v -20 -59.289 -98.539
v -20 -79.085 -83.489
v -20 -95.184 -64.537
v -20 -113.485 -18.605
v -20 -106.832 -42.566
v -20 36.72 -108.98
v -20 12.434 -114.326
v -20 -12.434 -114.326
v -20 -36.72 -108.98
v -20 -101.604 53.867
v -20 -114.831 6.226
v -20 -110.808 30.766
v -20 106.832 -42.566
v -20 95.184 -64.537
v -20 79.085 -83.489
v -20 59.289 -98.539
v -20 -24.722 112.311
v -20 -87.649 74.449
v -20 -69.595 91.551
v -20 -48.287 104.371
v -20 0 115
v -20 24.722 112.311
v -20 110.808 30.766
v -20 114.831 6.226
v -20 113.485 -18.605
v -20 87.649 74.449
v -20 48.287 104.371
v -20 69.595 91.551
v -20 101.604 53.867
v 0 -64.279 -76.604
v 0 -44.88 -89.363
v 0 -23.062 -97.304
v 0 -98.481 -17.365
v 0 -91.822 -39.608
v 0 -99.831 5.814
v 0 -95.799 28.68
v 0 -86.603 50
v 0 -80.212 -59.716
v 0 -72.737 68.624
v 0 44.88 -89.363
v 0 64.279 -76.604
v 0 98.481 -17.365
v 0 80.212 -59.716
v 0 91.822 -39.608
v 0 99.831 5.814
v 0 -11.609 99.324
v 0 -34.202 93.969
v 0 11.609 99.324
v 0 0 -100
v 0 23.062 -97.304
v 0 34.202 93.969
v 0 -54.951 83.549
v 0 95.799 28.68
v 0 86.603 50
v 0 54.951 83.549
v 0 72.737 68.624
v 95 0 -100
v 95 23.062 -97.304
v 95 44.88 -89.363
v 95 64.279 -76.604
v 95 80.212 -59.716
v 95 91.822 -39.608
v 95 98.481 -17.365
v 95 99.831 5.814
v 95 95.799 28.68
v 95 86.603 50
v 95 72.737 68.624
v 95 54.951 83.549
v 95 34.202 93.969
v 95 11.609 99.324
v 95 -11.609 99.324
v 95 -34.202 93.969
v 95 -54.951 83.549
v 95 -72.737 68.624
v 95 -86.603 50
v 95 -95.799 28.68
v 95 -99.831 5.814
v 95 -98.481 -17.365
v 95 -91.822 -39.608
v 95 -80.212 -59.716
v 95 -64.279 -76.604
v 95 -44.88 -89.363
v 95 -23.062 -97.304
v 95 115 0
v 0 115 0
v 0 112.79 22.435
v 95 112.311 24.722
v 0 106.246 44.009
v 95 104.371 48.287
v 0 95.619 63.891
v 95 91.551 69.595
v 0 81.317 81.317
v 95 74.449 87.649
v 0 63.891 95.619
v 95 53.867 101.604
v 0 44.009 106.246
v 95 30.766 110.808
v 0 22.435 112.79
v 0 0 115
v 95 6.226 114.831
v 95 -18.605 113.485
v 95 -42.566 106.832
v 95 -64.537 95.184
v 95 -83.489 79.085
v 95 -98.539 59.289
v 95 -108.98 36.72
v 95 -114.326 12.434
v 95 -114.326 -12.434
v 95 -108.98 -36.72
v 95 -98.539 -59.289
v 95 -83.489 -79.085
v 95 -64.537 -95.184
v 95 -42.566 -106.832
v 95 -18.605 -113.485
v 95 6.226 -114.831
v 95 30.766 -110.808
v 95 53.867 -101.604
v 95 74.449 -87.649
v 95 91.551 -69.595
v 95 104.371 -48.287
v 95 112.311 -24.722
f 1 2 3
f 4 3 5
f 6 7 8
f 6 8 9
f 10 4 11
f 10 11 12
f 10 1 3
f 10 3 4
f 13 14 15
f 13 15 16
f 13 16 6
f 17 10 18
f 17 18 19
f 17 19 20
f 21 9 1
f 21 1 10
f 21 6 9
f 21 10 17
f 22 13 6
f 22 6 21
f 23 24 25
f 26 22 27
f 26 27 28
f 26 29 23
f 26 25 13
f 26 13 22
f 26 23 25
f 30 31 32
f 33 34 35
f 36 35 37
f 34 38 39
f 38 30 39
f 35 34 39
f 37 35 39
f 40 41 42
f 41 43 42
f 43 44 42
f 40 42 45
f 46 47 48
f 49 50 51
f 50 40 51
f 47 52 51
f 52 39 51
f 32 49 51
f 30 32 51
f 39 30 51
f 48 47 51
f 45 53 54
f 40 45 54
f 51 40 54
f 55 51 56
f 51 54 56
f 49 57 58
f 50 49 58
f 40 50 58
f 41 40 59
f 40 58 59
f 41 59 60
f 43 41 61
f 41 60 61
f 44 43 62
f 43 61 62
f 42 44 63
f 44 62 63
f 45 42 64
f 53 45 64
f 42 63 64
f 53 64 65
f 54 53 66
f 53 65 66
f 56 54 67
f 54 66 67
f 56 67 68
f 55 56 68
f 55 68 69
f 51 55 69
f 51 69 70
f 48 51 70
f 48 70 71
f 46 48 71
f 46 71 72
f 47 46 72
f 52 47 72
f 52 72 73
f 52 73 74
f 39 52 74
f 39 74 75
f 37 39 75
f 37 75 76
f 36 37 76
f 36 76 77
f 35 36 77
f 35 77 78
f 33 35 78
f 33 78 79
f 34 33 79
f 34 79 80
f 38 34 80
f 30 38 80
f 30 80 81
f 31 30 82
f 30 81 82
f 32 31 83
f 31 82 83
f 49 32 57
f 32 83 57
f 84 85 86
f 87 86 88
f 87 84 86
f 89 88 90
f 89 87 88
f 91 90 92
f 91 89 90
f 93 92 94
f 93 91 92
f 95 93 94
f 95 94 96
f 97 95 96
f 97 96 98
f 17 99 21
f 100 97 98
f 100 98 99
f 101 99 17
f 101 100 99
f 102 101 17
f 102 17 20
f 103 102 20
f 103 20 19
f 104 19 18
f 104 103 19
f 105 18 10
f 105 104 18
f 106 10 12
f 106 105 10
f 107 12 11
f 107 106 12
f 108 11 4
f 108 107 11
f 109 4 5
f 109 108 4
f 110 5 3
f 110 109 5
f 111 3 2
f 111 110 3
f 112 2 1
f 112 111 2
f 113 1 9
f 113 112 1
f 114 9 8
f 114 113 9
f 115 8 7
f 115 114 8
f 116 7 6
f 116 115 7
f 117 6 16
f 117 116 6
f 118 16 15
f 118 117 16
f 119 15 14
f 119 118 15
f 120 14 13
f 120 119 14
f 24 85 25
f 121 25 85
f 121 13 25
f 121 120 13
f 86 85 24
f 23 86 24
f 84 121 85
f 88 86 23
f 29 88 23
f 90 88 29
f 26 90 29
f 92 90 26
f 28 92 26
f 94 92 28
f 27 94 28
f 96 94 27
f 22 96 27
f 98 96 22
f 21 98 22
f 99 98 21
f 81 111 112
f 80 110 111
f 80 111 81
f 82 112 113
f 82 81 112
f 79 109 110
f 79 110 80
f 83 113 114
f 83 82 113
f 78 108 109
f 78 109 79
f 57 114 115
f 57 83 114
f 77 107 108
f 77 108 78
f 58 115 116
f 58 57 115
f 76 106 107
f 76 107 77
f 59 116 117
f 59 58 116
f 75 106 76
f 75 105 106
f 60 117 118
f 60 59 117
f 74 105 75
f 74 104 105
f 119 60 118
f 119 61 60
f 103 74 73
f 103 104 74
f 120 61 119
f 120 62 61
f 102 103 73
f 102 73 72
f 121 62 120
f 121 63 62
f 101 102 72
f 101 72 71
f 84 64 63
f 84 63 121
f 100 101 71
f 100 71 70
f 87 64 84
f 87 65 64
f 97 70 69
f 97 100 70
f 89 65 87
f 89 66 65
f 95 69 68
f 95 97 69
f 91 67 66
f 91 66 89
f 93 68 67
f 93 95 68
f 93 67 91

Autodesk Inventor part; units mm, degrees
ref_plane "YZ Plane" through (0, 0, 0) normal (1, 0, 0) x (0, 1, 0)
ref_plane "XZ Plane" through (0, 0, 0) normal (0, 1, 0) x (-1, 0, 0)
ref_plane "XY Plane" through (0, 0, 0) normal (0, 0, 1) x (1, 0, 0)
sketch "Esquisse1" plane through (0, 0, 0) normal (1, 0, 0) x (0, 1, 0)
  circle A0 centre (0, 0) radius 115
  dimension "d0" = 230
extrude "Extrusion1" add sketch "Esquisse1" along normal blind 95
sketch "Esquisse2" plane through (95, 0, 0) normal (1, 0, 0) x (0, 0, -1)
  circle A0 centre (0, 0) radius 100
  dimension "d3" = 200
extrude "Extrusion2" cut sketch "Esquisse2" against normal blind 95
sketch "Esquisse3" plane through (0, 0, 0) normal (-1, 0, 0) x (0, 0, 1)
  circle A0 centre (0, 0) radius 115
  dimension "d6" = 230
extrude "Extrusion3" add sketch "Esquisse3" along normal blind 20
